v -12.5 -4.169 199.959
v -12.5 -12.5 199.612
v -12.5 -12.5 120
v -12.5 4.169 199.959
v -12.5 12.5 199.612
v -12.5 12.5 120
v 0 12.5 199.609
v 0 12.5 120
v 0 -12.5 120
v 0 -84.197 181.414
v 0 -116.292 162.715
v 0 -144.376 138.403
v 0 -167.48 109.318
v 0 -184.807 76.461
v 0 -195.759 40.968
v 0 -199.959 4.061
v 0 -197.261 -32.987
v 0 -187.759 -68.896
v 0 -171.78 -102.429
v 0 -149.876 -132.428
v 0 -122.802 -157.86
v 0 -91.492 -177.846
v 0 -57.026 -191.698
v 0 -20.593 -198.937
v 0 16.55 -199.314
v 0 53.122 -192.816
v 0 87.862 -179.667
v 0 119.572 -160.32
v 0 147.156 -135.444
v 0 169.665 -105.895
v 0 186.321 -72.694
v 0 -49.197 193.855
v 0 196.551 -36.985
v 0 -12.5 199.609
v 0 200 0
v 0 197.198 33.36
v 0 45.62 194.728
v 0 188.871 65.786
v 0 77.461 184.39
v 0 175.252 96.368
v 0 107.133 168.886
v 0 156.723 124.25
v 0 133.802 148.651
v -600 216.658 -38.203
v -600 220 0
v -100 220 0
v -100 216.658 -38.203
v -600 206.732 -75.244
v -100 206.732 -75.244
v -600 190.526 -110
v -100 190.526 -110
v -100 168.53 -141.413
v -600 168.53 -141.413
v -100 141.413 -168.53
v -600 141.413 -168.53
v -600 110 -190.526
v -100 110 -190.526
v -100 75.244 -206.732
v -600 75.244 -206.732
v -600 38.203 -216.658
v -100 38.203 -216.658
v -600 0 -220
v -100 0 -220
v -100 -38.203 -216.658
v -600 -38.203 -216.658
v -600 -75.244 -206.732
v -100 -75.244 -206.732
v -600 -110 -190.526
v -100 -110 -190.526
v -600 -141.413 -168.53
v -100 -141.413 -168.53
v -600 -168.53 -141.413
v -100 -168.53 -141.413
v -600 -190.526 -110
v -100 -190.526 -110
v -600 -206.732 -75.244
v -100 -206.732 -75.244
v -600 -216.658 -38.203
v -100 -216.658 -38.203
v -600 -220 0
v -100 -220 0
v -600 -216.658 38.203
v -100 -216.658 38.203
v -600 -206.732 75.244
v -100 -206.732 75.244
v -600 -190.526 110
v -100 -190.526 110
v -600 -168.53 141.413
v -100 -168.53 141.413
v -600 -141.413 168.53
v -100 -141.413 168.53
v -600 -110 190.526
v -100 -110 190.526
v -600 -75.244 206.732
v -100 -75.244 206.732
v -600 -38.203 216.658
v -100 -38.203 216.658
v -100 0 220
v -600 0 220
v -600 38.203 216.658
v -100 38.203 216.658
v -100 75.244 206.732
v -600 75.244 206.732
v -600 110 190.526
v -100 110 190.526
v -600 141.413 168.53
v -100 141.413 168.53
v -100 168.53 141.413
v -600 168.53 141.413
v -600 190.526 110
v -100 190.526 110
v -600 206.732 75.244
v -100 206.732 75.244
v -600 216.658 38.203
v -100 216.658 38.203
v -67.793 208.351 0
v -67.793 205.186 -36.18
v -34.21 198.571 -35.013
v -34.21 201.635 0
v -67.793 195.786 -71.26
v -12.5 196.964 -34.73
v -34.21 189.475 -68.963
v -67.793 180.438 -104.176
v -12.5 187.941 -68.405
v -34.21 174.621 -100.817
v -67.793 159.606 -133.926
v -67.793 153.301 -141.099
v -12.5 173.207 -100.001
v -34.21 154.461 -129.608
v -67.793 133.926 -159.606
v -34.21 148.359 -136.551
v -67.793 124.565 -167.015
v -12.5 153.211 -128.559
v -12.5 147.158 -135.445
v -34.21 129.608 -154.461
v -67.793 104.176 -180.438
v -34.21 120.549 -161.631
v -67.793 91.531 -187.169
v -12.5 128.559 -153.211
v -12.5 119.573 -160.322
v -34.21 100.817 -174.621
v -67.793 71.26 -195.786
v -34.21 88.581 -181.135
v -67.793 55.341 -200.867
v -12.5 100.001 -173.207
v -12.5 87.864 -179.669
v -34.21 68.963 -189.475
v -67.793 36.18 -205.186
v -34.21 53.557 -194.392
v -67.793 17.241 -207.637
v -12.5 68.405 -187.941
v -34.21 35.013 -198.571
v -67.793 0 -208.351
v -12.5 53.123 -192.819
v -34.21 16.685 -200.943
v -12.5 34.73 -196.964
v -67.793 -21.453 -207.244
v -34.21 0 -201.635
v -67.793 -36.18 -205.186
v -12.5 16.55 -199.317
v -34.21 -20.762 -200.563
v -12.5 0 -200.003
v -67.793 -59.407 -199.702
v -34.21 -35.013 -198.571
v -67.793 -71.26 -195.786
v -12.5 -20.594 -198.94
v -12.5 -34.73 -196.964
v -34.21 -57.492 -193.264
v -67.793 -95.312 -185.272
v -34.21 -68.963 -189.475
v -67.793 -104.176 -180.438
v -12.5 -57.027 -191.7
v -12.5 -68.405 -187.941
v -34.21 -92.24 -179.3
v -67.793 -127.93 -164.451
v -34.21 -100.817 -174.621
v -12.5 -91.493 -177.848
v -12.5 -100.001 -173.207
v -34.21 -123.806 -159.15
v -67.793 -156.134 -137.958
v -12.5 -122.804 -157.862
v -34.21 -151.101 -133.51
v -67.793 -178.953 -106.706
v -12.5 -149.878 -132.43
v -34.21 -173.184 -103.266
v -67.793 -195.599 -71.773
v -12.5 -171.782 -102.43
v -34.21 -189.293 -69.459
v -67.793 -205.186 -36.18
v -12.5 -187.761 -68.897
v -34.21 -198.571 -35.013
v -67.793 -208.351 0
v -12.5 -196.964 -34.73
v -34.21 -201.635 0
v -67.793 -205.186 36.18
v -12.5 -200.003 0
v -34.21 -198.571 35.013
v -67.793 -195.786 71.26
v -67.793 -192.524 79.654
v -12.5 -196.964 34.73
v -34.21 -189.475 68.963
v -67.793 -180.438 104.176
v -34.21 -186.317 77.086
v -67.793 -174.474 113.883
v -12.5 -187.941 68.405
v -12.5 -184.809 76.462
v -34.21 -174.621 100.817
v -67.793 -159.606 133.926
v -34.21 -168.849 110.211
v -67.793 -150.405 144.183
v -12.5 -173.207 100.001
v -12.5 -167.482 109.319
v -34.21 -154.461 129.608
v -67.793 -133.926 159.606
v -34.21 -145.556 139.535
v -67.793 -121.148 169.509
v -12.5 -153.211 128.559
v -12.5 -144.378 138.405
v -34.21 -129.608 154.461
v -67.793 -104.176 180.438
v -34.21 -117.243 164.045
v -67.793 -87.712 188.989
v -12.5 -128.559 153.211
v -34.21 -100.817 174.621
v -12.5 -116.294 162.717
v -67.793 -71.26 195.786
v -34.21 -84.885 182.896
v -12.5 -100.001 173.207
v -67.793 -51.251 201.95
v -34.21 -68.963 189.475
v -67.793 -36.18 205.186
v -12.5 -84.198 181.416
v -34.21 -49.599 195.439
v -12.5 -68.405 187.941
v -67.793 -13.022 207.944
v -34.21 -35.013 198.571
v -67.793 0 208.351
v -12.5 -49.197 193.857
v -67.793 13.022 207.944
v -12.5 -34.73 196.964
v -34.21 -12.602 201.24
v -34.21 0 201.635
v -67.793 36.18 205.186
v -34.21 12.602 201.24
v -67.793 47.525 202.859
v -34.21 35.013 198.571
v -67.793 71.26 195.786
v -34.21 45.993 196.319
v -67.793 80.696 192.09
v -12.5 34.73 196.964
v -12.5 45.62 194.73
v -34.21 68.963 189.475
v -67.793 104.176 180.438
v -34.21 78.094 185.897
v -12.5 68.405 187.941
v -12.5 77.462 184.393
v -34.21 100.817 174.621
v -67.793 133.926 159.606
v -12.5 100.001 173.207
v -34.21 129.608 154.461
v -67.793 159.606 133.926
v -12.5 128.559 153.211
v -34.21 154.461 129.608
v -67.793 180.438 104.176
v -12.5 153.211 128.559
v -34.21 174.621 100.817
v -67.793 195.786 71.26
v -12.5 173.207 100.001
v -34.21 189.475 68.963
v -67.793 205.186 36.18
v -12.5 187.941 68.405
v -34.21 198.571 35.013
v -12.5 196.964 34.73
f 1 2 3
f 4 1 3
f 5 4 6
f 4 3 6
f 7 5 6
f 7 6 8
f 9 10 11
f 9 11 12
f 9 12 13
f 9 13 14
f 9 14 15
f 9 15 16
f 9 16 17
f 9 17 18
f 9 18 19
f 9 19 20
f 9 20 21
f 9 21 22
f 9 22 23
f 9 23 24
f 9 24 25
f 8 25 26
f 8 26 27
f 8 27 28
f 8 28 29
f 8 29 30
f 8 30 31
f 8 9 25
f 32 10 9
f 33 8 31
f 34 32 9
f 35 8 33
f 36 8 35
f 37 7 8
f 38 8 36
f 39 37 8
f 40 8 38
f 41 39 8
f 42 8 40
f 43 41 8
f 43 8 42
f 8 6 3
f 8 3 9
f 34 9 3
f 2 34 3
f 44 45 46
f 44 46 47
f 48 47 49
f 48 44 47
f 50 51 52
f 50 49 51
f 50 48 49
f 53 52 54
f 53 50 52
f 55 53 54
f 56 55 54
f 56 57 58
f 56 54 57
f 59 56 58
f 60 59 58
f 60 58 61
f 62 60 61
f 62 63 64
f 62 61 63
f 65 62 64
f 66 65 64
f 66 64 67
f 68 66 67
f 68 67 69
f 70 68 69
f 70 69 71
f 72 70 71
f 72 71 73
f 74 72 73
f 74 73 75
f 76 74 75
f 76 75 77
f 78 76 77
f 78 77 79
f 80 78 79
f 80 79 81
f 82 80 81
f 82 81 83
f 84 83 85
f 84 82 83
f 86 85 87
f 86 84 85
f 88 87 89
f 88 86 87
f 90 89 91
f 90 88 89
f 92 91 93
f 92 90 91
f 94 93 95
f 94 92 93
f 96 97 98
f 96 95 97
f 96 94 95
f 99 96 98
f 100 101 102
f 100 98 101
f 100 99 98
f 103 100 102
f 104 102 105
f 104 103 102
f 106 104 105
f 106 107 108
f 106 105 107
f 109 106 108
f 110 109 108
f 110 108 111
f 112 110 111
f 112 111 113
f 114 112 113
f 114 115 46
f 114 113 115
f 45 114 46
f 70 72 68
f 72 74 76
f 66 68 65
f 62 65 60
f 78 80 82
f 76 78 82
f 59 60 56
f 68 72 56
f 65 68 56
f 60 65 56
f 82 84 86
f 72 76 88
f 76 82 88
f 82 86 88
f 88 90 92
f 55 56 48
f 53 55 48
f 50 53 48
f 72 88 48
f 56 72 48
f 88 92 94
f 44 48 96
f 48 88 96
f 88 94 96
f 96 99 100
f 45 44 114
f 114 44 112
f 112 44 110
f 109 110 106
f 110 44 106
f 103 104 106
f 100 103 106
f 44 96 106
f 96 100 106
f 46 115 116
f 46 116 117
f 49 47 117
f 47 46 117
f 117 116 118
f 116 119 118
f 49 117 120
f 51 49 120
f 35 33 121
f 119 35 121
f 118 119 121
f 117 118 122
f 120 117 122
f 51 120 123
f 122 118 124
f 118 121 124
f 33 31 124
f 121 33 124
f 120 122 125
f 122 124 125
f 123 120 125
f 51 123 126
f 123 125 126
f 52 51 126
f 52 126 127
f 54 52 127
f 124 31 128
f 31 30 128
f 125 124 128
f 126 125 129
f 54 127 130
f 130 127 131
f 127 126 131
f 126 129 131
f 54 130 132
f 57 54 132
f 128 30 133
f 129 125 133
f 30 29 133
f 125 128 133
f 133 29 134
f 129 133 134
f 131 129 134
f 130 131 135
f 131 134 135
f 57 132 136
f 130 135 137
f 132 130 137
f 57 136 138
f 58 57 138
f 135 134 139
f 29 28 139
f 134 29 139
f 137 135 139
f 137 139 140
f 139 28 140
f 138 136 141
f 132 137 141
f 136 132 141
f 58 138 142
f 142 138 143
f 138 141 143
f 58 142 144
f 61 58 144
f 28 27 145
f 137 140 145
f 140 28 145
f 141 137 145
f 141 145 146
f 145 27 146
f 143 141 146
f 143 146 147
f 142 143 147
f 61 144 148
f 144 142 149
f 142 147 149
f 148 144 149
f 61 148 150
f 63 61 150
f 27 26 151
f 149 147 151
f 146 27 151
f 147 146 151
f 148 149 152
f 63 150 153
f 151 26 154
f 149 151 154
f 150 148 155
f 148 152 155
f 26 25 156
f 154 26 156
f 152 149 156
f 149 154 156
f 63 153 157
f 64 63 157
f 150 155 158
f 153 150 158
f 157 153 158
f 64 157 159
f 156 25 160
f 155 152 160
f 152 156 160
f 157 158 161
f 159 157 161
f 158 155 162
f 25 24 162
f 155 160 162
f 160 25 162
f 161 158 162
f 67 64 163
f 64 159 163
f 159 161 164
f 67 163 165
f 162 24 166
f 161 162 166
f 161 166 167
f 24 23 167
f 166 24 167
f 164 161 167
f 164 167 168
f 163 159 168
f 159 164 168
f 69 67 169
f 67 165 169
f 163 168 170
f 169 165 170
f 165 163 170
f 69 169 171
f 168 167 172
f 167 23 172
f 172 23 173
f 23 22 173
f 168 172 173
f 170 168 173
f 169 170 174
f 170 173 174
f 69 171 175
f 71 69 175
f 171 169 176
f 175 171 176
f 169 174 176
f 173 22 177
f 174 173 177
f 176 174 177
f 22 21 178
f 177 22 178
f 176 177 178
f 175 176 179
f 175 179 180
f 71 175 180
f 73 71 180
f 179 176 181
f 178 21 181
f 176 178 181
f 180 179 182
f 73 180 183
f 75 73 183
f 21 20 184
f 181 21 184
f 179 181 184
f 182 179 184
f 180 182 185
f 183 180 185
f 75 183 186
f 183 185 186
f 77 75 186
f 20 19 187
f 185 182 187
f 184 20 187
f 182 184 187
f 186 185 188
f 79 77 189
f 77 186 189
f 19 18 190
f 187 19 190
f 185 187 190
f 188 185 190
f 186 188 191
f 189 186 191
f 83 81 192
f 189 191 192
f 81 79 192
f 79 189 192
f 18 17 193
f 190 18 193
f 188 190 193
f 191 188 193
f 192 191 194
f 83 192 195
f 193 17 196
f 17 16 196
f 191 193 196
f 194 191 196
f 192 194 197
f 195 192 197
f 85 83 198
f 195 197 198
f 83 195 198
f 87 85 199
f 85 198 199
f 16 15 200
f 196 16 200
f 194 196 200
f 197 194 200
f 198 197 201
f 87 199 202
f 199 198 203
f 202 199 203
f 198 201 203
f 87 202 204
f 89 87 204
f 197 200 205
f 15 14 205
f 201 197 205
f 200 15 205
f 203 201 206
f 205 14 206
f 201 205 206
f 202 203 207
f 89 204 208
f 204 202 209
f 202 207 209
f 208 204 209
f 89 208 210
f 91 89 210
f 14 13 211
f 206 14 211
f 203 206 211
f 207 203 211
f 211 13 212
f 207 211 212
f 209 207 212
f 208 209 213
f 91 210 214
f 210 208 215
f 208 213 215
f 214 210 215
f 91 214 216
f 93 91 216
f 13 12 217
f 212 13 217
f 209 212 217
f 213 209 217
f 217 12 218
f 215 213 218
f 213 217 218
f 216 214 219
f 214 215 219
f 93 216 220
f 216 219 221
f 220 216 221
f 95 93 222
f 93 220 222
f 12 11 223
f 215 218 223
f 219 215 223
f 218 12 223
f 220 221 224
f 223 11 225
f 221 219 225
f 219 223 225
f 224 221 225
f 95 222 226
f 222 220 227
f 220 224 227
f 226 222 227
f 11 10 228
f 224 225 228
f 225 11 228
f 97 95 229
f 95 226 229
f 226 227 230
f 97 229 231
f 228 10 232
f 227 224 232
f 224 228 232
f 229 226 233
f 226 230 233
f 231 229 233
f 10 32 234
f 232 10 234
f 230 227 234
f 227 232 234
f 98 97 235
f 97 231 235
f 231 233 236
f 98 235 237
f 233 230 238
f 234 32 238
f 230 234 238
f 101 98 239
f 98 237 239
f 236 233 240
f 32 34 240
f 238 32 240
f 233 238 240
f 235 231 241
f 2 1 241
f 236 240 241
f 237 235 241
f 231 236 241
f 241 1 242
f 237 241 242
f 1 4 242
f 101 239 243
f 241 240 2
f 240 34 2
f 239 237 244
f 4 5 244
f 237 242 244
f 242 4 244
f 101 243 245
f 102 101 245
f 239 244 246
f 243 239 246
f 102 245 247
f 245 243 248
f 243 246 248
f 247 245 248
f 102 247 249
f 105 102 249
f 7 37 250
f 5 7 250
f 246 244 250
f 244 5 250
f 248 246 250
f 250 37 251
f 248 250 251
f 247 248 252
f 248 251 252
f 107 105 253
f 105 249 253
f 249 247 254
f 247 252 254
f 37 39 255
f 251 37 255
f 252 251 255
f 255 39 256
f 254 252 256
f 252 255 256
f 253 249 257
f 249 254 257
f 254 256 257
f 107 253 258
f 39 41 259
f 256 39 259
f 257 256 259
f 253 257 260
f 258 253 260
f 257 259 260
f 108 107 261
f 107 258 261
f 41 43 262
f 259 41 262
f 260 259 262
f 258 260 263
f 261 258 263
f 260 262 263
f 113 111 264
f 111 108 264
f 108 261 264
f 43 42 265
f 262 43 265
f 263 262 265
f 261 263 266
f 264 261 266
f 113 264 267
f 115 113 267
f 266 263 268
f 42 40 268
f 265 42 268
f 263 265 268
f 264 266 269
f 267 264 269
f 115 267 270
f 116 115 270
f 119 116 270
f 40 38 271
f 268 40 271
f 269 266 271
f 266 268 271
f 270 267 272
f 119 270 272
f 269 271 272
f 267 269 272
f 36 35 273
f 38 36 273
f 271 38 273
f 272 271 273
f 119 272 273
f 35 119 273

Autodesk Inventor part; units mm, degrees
ref_plane "YZ Plane" through (0, 0, 0) normal (1, 0, 0) x (0, 1, 0)
ref_plane "XZ Plane" through (0, 0, 0) normal (0, 1, 0) x (-1, 0, 0)
sketch "Sketch2" plane through (0, 0, 0) normal (0, 0, 1) x (1, 0, 0)
  line L0 (0, 0) -> (0, 200)
  arc A0 (-100, 220) -> (0, 200) centre (-6.2023, 428.9887) ccw
  line L1 (-100, 220) -> (-600, 220)
  line L2 (-600, 220) -> (-600, 0)
  line L3 (-600, 0) -> (0, 0)
  dimension "d4" = 200
  dimension "d7" = 500
revolve "Revolution1" add sketch "Sketch2" angle 360 about axis through (-600, 0, 0) along (1, 0, 0)
ref_plane "Work Plane1" through (0, 0, 120) normal (0, 0, 1) x (1, 0, 0)
sketch "Sketch3" plane through (0, 0, 120) normal (0, 0, 1) x (1, 0, 0)
  line L0 (12.5, -12.5) -> (-12.5, -12.5)
  line L1 (-12.5, -12.5) -> (-12.5, 12.5)
  line L2 (-12.5, 12.5) -> (12.5, 12.5)
  line L3 (12.5, 12.5) -> (12.5, -12.5)
  line L4 (12.5, -12.5) -> (-12.5, 12.5) construction
  line L5 (-12.5, -12.5) -> (12.5, 12.5) construction
  point P0 (0, 0)
  dimension "d10" = 25
  dimension "d11" = 25
extrude "Extrusion1" cut sketch "Sketch3" along normal blind 200
properties part number "Practica 2"
